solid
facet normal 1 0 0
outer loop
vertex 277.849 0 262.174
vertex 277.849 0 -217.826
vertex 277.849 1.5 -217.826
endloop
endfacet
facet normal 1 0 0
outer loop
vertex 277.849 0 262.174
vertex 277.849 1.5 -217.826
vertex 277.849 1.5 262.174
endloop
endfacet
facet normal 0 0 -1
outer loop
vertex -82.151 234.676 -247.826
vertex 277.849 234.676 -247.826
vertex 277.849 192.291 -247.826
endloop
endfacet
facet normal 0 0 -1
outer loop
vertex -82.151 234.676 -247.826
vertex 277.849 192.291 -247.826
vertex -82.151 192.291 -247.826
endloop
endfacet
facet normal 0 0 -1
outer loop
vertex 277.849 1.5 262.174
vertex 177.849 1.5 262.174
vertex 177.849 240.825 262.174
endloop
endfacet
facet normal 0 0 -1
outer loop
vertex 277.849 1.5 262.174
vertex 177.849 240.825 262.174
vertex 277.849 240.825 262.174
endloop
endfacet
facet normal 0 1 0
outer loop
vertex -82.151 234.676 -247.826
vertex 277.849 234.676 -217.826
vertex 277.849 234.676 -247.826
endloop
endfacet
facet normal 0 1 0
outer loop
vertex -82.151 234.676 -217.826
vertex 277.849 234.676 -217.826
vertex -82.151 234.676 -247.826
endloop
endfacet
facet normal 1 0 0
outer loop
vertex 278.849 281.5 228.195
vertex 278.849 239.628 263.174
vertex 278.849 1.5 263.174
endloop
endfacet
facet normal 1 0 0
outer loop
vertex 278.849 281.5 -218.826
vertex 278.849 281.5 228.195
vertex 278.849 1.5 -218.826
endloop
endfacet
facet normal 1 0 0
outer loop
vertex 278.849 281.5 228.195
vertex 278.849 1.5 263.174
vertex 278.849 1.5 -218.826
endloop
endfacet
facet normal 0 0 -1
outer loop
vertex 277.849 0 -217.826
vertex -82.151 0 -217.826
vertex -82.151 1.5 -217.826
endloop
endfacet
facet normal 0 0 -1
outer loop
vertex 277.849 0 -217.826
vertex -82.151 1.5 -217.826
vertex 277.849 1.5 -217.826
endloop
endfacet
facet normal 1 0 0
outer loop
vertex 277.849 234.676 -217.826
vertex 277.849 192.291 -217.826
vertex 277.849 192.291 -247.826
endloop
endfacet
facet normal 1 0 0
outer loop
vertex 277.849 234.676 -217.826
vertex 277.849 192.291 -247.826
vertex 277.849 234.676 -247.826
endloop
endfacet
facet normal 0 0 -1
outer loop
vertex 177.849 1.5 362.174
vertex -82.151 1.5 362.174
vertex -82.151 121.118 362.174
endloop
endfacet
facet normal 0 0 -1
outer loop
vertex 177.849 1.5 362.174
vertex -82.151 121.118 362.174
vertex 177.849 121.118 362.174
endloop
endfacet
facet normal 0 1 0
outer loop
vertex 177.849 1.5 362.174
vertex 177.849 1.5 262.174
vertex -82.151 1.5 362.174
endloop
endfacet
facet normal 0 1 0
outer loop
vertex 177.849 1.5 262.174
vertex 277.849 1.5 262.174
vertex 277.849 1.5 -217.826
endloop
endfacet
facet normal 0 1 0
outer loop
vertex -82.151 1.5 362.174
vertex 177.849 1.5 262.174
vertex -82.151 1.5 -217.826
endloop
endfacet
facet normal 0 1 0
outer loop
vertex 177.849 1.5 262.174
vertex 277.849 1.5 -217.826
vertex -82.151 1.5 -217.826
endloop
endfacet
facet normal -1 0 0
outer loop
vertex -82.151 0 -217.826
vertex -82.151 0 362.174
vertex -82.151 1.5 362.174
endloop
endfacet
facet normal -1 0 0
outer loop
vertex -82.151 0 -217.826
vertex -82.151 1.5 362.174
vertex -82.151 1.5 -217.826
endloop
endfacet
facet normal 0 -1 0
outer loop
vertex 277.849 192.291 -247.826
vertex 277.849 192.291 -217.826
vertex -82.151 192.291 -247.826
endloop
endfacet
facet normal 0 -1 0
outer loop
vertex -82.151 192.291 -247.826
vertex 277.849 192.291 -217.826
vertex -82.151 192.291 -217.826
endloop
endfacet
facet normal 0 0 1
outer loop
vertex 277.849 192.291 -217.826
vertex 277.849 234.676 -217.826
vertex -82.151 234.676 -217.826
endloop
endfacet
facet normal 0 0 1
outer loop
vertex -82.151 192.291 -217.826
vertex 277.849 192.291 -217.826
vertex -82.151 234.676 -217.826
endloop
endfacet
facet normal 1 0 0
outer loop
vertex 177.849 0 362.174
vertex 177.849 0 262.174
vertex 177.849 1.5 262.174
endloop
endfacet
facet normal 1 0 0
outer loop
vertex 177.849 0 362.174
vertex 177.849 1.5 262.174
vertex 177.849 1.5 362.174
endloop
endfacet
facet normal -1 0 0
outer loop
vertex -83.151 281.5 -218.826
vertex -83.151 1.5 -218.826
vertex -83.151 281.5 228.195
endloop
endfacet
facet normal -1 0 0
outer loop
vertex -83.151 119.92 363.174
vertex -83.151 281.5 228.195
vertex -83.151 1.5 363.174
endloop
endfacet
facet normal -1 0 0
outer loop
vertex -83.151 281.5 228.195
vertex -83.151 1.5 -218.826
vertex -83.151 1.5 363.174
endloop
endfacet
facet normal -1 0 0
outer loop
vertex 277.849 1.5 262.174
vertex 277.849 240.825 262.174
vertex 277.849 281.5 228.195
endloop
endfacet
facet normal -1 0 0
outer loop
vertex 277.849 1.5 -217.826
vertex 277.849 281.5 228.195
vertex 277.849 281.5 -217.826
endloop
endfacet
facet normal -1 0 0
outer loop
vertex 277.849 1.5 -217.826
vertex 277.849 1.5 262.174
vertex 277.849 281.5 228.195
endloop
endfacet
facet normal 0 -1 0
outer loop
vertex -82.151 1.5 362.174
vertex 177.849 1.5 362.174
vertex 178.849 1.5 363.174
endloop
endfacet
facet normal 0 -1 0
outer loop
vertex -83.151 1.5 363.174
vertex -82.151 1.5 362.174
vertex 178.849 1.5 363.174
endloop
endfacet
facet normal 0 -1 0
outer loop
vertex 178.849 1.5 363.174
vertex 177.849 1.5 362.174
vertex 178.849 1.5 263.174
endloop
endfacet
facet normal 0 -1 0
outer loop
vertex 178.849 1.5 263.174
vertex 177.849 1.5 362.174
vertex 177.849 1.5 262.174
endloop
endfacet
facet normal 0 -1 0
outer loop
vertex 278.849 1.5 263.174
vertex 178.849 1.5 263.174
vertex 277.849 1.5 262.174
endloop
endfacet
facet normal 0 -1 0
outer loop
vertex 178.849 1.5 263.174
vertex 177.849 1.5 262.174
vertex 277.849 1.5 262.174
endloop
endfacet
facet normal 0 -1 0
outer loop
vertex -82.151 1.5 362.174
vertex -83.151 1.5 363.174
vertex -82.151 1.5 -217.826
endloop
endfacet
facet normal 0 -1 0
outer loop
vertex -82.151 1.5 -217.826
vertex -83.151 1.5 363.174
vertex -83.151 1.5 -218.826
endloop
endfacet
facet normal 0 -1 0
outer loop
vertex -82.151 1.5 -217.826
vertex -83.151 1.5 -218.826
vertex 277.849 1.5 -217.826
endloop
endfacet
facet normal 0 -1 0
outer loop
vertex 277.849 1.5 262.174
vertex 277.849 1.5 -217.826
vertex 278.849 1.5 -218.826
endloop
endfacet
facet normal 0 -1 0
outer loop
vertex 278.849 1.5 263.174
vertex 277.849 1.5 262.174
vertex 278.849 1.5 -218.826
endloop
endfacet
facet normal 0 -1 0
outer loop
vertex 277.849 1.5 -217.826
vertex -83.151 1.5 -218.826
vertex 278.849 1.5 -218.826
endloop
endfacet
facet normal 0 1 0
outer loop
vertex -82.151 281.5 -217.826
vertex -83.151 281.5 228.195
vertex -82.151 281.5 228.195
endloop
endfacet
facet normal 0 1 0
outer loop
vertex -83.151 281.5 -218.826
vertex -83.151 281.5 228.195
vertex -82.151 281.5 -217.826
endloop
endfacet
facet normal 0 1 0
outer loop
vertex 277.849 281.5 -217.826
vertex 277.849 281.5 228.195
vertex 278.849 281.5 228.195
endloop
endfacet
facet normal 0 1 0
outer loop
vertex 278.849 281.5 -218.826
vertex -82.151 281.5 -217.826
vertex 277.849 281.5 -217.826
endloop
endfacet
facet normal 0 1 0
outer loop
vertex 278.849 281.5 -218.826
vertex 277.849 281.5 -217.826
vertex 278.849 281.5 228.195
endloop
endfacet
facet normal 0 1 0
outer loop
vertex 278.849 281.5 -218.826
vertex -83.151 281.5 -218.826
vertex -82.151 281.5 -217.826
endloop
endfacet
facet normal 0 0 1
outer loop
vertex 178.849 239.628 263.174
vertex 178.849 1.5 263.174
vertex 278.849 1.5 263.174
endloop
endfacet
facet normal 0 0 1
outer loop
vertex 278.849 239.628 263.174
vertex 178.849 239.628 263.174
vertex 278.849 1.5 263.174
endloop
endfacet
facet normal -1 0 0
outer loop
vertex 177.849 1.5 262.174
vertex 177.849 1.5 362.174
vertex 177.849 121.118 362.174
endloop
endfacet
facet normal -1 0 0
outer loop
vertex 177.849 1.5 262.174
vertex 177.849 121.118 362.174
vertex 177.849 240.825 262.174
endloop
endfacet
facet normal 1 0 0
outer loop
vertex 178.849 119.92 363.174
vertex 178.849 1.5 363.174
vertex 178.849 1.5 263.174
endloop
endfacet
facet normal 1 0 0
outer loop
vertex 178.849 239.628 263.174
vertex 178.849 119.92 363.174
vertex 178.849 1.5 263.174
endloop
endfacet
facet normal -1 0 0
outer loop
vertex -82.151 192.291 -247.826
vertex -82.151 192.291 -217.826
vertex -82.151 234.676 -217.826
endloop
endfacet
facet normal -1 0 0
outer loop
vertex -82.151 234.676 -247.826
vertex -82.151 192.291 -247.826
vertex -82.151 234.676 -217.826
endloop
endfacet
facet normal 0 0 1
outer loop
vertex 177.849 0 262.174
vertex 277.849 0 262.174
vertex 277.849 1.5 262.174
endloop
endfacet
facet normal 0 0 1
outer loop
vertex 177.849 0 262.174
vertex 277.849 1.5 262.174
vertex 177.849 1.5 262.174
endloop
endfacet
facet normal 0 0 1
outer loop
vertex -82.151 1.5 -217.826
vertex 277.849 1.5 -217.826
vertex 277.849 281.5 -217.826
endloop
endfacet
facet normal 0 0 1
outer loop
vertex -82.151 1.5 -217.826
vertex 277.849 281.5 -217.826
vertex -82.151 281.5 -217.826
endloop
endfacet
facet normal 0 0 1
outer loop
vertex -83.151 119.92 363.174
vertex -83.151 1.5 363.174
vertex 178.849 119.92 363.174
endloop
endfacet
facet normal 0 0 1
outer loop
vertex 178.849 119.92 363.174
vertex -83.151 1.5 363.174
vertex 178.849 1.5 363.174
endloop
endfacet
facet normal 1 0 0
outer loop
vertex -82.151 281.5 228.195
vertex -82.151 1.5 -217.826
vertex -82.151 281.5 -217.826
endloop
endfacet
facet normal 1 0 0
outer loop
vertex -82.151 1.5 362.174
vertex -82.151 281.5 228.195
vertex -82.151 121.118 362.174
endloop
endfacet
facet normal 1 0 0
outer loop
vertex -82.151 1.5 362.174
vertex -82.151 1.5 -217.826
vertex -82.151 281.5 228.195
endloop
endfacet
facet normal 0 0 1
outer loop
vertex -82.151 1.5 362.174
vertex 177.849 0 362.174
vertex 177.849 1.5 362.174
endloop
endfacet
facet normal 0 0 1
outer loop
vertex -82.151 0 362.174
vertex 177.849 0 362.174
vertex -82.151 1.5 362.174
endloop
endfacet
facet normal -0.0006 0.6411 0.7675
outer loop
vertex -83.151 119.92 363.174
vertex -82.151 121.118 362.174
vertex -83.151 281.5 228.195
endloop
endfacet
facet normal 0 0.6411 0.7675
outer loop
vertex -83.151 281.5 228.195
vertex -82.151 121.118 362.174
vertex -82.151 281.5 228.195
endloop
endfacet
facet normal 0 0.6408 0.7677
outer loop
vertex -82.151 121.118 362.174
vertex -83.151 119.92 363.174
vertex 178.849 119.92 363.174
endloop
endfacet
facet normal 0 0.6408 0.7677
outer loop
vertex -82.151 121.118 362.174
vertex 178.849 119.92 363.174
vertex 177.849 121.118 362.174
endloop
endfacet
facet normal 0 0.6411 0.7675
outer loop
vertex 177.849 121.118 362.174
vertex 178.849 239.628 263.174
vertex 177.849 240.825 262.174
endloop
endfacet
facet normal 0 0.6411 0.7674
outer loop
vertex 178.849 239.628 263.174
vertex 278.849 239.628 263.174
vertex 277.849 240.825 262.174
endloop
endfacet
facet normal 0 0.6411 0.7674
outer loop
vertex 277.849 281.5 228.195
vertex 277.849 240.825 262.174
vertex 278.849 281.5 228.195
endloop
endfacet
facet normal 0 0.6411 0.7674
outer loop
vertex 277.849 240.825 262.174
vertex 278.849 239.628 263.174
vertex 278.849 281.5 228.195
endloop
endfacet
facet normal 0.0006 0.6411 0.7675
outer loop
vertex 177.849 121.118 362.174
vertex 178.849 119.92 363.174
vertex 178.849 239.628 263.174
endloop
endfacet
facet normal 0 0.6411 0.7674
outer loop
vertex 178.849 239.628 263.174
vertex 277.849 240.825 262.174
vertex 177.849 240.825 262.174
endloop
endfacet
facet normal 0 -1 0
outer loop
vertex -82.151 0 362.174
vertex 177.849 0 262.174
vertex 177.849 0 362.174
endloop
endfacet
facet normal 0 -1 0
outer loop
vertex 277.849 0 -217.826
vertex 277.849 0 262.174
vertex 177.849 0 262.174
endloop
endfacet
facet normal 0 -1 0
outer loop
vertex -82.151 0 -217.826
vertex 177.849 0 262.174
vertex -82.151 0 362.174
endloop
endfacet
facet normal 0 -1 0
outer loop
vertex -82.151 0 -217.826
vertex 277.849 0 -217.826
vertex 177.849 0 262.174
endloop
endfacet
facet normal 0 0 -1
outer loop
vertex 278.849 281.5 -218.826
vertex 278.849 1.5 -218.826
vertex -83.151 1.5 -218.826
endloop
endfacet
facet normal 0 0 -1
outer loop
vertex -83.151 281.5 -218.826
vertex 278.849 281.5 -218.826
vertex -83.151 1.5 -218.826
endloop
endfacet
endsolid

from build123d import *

# Parameters (mm, degrees)
BOSS_EXTRUDE1_DEPTH     = 1.5
BOSS_EXTRUDE2_DEPTH     = 280
SKETCH4_W               = 360
SKETCH4_H               = 42.385541564
BOSS_EXTRUDE3_DEPTH     = 30
CUT_EXTRUDE1_DEPTH      = 585.344407265
CUT_EXTRUDE1_DEPTH_BACK = 585.344407265


with BuildPart() as part:
    # Sketch1 → Boss-Extrude1 (new body)
    with BuildSketch(Plane(origin=(0, 0, 0), x_dir=(1, 0, 0), z_dir=(0, 1, 0))):
        Polygon((-82.151383235, 217.826300096), (277.848616765, 217.826300096), (277.848616765, -262.173699904), (177.848616765, -262.173699904), (177.848616765, -362.173699904), (-82.151383235, -362.173699904), align=None)
    extrude(amount=BOSS_EXTRUDE1_DEPTH)


with BuildPart() as body_2:
    # Sketch2 → Boss-Extrude2 (new body)
    with BuildSketch(Plane(origin=(0, 1.5, 0), x_dir=(1, 0, 0), z_dir=(0, 1, 0))):
        Polygon((-83.151383235, -363.173699904), (178.848616765, -363.173699904), (178.848616765, -263.173699904), (278.848616765, -263.173699904), (278.848616765, 218.826300096), (-83.151383235, 218.826300096), align=None)
        Polygon((-82.151383235, 217.826300096), (-82.151383235, -362.173699904), (177.848616765, -362.173699904), (177.848616765, -262.173699904), (277.848616765, -262.173699904), (277.848616765, 217.826300096), align=None, mode=Mode.SUBTRACT)
    extrude(amount=BOSS_EXTRUDE2_DEPTH)

    # Sketch3 → Cut-Extrude1 (cut, two sides: drawn at the far end of the back side and taken through both)
    with BuildSketch(Plane.ZY.offset(82.151383235).offset(-CUT_EXTRUDE1_DEPTH_BACK)):
        Polygon((363.173699904, 119.920481981), (228.195222706, 281.5), (363.173699904, 281.5), align=None)
    extrude(amount=CUT_EXTRUDE1_DEPTH + CUT_EXTRUDE1_DEPTH_BACK, mode=Mode.SUBTRACT)


with BuildPart() as body_3:
    # Sketch4 → Boss-Extrude3 (new body)
    with BuildSketch(Plane(origin=(0, 0, -217.826300096), x_dir=(-1, 0, 0), z_dir=(0, 0, -1))):
        with Locations((-97.848616765, 213.483316708)):
            Rectangle(SKETCH4_W, SKETCH4_H)
    extrude(amount=BOSS_EXTRUDE3_DEPTH)


solid = Compound([part.part, body_2.part, body_3.part])
